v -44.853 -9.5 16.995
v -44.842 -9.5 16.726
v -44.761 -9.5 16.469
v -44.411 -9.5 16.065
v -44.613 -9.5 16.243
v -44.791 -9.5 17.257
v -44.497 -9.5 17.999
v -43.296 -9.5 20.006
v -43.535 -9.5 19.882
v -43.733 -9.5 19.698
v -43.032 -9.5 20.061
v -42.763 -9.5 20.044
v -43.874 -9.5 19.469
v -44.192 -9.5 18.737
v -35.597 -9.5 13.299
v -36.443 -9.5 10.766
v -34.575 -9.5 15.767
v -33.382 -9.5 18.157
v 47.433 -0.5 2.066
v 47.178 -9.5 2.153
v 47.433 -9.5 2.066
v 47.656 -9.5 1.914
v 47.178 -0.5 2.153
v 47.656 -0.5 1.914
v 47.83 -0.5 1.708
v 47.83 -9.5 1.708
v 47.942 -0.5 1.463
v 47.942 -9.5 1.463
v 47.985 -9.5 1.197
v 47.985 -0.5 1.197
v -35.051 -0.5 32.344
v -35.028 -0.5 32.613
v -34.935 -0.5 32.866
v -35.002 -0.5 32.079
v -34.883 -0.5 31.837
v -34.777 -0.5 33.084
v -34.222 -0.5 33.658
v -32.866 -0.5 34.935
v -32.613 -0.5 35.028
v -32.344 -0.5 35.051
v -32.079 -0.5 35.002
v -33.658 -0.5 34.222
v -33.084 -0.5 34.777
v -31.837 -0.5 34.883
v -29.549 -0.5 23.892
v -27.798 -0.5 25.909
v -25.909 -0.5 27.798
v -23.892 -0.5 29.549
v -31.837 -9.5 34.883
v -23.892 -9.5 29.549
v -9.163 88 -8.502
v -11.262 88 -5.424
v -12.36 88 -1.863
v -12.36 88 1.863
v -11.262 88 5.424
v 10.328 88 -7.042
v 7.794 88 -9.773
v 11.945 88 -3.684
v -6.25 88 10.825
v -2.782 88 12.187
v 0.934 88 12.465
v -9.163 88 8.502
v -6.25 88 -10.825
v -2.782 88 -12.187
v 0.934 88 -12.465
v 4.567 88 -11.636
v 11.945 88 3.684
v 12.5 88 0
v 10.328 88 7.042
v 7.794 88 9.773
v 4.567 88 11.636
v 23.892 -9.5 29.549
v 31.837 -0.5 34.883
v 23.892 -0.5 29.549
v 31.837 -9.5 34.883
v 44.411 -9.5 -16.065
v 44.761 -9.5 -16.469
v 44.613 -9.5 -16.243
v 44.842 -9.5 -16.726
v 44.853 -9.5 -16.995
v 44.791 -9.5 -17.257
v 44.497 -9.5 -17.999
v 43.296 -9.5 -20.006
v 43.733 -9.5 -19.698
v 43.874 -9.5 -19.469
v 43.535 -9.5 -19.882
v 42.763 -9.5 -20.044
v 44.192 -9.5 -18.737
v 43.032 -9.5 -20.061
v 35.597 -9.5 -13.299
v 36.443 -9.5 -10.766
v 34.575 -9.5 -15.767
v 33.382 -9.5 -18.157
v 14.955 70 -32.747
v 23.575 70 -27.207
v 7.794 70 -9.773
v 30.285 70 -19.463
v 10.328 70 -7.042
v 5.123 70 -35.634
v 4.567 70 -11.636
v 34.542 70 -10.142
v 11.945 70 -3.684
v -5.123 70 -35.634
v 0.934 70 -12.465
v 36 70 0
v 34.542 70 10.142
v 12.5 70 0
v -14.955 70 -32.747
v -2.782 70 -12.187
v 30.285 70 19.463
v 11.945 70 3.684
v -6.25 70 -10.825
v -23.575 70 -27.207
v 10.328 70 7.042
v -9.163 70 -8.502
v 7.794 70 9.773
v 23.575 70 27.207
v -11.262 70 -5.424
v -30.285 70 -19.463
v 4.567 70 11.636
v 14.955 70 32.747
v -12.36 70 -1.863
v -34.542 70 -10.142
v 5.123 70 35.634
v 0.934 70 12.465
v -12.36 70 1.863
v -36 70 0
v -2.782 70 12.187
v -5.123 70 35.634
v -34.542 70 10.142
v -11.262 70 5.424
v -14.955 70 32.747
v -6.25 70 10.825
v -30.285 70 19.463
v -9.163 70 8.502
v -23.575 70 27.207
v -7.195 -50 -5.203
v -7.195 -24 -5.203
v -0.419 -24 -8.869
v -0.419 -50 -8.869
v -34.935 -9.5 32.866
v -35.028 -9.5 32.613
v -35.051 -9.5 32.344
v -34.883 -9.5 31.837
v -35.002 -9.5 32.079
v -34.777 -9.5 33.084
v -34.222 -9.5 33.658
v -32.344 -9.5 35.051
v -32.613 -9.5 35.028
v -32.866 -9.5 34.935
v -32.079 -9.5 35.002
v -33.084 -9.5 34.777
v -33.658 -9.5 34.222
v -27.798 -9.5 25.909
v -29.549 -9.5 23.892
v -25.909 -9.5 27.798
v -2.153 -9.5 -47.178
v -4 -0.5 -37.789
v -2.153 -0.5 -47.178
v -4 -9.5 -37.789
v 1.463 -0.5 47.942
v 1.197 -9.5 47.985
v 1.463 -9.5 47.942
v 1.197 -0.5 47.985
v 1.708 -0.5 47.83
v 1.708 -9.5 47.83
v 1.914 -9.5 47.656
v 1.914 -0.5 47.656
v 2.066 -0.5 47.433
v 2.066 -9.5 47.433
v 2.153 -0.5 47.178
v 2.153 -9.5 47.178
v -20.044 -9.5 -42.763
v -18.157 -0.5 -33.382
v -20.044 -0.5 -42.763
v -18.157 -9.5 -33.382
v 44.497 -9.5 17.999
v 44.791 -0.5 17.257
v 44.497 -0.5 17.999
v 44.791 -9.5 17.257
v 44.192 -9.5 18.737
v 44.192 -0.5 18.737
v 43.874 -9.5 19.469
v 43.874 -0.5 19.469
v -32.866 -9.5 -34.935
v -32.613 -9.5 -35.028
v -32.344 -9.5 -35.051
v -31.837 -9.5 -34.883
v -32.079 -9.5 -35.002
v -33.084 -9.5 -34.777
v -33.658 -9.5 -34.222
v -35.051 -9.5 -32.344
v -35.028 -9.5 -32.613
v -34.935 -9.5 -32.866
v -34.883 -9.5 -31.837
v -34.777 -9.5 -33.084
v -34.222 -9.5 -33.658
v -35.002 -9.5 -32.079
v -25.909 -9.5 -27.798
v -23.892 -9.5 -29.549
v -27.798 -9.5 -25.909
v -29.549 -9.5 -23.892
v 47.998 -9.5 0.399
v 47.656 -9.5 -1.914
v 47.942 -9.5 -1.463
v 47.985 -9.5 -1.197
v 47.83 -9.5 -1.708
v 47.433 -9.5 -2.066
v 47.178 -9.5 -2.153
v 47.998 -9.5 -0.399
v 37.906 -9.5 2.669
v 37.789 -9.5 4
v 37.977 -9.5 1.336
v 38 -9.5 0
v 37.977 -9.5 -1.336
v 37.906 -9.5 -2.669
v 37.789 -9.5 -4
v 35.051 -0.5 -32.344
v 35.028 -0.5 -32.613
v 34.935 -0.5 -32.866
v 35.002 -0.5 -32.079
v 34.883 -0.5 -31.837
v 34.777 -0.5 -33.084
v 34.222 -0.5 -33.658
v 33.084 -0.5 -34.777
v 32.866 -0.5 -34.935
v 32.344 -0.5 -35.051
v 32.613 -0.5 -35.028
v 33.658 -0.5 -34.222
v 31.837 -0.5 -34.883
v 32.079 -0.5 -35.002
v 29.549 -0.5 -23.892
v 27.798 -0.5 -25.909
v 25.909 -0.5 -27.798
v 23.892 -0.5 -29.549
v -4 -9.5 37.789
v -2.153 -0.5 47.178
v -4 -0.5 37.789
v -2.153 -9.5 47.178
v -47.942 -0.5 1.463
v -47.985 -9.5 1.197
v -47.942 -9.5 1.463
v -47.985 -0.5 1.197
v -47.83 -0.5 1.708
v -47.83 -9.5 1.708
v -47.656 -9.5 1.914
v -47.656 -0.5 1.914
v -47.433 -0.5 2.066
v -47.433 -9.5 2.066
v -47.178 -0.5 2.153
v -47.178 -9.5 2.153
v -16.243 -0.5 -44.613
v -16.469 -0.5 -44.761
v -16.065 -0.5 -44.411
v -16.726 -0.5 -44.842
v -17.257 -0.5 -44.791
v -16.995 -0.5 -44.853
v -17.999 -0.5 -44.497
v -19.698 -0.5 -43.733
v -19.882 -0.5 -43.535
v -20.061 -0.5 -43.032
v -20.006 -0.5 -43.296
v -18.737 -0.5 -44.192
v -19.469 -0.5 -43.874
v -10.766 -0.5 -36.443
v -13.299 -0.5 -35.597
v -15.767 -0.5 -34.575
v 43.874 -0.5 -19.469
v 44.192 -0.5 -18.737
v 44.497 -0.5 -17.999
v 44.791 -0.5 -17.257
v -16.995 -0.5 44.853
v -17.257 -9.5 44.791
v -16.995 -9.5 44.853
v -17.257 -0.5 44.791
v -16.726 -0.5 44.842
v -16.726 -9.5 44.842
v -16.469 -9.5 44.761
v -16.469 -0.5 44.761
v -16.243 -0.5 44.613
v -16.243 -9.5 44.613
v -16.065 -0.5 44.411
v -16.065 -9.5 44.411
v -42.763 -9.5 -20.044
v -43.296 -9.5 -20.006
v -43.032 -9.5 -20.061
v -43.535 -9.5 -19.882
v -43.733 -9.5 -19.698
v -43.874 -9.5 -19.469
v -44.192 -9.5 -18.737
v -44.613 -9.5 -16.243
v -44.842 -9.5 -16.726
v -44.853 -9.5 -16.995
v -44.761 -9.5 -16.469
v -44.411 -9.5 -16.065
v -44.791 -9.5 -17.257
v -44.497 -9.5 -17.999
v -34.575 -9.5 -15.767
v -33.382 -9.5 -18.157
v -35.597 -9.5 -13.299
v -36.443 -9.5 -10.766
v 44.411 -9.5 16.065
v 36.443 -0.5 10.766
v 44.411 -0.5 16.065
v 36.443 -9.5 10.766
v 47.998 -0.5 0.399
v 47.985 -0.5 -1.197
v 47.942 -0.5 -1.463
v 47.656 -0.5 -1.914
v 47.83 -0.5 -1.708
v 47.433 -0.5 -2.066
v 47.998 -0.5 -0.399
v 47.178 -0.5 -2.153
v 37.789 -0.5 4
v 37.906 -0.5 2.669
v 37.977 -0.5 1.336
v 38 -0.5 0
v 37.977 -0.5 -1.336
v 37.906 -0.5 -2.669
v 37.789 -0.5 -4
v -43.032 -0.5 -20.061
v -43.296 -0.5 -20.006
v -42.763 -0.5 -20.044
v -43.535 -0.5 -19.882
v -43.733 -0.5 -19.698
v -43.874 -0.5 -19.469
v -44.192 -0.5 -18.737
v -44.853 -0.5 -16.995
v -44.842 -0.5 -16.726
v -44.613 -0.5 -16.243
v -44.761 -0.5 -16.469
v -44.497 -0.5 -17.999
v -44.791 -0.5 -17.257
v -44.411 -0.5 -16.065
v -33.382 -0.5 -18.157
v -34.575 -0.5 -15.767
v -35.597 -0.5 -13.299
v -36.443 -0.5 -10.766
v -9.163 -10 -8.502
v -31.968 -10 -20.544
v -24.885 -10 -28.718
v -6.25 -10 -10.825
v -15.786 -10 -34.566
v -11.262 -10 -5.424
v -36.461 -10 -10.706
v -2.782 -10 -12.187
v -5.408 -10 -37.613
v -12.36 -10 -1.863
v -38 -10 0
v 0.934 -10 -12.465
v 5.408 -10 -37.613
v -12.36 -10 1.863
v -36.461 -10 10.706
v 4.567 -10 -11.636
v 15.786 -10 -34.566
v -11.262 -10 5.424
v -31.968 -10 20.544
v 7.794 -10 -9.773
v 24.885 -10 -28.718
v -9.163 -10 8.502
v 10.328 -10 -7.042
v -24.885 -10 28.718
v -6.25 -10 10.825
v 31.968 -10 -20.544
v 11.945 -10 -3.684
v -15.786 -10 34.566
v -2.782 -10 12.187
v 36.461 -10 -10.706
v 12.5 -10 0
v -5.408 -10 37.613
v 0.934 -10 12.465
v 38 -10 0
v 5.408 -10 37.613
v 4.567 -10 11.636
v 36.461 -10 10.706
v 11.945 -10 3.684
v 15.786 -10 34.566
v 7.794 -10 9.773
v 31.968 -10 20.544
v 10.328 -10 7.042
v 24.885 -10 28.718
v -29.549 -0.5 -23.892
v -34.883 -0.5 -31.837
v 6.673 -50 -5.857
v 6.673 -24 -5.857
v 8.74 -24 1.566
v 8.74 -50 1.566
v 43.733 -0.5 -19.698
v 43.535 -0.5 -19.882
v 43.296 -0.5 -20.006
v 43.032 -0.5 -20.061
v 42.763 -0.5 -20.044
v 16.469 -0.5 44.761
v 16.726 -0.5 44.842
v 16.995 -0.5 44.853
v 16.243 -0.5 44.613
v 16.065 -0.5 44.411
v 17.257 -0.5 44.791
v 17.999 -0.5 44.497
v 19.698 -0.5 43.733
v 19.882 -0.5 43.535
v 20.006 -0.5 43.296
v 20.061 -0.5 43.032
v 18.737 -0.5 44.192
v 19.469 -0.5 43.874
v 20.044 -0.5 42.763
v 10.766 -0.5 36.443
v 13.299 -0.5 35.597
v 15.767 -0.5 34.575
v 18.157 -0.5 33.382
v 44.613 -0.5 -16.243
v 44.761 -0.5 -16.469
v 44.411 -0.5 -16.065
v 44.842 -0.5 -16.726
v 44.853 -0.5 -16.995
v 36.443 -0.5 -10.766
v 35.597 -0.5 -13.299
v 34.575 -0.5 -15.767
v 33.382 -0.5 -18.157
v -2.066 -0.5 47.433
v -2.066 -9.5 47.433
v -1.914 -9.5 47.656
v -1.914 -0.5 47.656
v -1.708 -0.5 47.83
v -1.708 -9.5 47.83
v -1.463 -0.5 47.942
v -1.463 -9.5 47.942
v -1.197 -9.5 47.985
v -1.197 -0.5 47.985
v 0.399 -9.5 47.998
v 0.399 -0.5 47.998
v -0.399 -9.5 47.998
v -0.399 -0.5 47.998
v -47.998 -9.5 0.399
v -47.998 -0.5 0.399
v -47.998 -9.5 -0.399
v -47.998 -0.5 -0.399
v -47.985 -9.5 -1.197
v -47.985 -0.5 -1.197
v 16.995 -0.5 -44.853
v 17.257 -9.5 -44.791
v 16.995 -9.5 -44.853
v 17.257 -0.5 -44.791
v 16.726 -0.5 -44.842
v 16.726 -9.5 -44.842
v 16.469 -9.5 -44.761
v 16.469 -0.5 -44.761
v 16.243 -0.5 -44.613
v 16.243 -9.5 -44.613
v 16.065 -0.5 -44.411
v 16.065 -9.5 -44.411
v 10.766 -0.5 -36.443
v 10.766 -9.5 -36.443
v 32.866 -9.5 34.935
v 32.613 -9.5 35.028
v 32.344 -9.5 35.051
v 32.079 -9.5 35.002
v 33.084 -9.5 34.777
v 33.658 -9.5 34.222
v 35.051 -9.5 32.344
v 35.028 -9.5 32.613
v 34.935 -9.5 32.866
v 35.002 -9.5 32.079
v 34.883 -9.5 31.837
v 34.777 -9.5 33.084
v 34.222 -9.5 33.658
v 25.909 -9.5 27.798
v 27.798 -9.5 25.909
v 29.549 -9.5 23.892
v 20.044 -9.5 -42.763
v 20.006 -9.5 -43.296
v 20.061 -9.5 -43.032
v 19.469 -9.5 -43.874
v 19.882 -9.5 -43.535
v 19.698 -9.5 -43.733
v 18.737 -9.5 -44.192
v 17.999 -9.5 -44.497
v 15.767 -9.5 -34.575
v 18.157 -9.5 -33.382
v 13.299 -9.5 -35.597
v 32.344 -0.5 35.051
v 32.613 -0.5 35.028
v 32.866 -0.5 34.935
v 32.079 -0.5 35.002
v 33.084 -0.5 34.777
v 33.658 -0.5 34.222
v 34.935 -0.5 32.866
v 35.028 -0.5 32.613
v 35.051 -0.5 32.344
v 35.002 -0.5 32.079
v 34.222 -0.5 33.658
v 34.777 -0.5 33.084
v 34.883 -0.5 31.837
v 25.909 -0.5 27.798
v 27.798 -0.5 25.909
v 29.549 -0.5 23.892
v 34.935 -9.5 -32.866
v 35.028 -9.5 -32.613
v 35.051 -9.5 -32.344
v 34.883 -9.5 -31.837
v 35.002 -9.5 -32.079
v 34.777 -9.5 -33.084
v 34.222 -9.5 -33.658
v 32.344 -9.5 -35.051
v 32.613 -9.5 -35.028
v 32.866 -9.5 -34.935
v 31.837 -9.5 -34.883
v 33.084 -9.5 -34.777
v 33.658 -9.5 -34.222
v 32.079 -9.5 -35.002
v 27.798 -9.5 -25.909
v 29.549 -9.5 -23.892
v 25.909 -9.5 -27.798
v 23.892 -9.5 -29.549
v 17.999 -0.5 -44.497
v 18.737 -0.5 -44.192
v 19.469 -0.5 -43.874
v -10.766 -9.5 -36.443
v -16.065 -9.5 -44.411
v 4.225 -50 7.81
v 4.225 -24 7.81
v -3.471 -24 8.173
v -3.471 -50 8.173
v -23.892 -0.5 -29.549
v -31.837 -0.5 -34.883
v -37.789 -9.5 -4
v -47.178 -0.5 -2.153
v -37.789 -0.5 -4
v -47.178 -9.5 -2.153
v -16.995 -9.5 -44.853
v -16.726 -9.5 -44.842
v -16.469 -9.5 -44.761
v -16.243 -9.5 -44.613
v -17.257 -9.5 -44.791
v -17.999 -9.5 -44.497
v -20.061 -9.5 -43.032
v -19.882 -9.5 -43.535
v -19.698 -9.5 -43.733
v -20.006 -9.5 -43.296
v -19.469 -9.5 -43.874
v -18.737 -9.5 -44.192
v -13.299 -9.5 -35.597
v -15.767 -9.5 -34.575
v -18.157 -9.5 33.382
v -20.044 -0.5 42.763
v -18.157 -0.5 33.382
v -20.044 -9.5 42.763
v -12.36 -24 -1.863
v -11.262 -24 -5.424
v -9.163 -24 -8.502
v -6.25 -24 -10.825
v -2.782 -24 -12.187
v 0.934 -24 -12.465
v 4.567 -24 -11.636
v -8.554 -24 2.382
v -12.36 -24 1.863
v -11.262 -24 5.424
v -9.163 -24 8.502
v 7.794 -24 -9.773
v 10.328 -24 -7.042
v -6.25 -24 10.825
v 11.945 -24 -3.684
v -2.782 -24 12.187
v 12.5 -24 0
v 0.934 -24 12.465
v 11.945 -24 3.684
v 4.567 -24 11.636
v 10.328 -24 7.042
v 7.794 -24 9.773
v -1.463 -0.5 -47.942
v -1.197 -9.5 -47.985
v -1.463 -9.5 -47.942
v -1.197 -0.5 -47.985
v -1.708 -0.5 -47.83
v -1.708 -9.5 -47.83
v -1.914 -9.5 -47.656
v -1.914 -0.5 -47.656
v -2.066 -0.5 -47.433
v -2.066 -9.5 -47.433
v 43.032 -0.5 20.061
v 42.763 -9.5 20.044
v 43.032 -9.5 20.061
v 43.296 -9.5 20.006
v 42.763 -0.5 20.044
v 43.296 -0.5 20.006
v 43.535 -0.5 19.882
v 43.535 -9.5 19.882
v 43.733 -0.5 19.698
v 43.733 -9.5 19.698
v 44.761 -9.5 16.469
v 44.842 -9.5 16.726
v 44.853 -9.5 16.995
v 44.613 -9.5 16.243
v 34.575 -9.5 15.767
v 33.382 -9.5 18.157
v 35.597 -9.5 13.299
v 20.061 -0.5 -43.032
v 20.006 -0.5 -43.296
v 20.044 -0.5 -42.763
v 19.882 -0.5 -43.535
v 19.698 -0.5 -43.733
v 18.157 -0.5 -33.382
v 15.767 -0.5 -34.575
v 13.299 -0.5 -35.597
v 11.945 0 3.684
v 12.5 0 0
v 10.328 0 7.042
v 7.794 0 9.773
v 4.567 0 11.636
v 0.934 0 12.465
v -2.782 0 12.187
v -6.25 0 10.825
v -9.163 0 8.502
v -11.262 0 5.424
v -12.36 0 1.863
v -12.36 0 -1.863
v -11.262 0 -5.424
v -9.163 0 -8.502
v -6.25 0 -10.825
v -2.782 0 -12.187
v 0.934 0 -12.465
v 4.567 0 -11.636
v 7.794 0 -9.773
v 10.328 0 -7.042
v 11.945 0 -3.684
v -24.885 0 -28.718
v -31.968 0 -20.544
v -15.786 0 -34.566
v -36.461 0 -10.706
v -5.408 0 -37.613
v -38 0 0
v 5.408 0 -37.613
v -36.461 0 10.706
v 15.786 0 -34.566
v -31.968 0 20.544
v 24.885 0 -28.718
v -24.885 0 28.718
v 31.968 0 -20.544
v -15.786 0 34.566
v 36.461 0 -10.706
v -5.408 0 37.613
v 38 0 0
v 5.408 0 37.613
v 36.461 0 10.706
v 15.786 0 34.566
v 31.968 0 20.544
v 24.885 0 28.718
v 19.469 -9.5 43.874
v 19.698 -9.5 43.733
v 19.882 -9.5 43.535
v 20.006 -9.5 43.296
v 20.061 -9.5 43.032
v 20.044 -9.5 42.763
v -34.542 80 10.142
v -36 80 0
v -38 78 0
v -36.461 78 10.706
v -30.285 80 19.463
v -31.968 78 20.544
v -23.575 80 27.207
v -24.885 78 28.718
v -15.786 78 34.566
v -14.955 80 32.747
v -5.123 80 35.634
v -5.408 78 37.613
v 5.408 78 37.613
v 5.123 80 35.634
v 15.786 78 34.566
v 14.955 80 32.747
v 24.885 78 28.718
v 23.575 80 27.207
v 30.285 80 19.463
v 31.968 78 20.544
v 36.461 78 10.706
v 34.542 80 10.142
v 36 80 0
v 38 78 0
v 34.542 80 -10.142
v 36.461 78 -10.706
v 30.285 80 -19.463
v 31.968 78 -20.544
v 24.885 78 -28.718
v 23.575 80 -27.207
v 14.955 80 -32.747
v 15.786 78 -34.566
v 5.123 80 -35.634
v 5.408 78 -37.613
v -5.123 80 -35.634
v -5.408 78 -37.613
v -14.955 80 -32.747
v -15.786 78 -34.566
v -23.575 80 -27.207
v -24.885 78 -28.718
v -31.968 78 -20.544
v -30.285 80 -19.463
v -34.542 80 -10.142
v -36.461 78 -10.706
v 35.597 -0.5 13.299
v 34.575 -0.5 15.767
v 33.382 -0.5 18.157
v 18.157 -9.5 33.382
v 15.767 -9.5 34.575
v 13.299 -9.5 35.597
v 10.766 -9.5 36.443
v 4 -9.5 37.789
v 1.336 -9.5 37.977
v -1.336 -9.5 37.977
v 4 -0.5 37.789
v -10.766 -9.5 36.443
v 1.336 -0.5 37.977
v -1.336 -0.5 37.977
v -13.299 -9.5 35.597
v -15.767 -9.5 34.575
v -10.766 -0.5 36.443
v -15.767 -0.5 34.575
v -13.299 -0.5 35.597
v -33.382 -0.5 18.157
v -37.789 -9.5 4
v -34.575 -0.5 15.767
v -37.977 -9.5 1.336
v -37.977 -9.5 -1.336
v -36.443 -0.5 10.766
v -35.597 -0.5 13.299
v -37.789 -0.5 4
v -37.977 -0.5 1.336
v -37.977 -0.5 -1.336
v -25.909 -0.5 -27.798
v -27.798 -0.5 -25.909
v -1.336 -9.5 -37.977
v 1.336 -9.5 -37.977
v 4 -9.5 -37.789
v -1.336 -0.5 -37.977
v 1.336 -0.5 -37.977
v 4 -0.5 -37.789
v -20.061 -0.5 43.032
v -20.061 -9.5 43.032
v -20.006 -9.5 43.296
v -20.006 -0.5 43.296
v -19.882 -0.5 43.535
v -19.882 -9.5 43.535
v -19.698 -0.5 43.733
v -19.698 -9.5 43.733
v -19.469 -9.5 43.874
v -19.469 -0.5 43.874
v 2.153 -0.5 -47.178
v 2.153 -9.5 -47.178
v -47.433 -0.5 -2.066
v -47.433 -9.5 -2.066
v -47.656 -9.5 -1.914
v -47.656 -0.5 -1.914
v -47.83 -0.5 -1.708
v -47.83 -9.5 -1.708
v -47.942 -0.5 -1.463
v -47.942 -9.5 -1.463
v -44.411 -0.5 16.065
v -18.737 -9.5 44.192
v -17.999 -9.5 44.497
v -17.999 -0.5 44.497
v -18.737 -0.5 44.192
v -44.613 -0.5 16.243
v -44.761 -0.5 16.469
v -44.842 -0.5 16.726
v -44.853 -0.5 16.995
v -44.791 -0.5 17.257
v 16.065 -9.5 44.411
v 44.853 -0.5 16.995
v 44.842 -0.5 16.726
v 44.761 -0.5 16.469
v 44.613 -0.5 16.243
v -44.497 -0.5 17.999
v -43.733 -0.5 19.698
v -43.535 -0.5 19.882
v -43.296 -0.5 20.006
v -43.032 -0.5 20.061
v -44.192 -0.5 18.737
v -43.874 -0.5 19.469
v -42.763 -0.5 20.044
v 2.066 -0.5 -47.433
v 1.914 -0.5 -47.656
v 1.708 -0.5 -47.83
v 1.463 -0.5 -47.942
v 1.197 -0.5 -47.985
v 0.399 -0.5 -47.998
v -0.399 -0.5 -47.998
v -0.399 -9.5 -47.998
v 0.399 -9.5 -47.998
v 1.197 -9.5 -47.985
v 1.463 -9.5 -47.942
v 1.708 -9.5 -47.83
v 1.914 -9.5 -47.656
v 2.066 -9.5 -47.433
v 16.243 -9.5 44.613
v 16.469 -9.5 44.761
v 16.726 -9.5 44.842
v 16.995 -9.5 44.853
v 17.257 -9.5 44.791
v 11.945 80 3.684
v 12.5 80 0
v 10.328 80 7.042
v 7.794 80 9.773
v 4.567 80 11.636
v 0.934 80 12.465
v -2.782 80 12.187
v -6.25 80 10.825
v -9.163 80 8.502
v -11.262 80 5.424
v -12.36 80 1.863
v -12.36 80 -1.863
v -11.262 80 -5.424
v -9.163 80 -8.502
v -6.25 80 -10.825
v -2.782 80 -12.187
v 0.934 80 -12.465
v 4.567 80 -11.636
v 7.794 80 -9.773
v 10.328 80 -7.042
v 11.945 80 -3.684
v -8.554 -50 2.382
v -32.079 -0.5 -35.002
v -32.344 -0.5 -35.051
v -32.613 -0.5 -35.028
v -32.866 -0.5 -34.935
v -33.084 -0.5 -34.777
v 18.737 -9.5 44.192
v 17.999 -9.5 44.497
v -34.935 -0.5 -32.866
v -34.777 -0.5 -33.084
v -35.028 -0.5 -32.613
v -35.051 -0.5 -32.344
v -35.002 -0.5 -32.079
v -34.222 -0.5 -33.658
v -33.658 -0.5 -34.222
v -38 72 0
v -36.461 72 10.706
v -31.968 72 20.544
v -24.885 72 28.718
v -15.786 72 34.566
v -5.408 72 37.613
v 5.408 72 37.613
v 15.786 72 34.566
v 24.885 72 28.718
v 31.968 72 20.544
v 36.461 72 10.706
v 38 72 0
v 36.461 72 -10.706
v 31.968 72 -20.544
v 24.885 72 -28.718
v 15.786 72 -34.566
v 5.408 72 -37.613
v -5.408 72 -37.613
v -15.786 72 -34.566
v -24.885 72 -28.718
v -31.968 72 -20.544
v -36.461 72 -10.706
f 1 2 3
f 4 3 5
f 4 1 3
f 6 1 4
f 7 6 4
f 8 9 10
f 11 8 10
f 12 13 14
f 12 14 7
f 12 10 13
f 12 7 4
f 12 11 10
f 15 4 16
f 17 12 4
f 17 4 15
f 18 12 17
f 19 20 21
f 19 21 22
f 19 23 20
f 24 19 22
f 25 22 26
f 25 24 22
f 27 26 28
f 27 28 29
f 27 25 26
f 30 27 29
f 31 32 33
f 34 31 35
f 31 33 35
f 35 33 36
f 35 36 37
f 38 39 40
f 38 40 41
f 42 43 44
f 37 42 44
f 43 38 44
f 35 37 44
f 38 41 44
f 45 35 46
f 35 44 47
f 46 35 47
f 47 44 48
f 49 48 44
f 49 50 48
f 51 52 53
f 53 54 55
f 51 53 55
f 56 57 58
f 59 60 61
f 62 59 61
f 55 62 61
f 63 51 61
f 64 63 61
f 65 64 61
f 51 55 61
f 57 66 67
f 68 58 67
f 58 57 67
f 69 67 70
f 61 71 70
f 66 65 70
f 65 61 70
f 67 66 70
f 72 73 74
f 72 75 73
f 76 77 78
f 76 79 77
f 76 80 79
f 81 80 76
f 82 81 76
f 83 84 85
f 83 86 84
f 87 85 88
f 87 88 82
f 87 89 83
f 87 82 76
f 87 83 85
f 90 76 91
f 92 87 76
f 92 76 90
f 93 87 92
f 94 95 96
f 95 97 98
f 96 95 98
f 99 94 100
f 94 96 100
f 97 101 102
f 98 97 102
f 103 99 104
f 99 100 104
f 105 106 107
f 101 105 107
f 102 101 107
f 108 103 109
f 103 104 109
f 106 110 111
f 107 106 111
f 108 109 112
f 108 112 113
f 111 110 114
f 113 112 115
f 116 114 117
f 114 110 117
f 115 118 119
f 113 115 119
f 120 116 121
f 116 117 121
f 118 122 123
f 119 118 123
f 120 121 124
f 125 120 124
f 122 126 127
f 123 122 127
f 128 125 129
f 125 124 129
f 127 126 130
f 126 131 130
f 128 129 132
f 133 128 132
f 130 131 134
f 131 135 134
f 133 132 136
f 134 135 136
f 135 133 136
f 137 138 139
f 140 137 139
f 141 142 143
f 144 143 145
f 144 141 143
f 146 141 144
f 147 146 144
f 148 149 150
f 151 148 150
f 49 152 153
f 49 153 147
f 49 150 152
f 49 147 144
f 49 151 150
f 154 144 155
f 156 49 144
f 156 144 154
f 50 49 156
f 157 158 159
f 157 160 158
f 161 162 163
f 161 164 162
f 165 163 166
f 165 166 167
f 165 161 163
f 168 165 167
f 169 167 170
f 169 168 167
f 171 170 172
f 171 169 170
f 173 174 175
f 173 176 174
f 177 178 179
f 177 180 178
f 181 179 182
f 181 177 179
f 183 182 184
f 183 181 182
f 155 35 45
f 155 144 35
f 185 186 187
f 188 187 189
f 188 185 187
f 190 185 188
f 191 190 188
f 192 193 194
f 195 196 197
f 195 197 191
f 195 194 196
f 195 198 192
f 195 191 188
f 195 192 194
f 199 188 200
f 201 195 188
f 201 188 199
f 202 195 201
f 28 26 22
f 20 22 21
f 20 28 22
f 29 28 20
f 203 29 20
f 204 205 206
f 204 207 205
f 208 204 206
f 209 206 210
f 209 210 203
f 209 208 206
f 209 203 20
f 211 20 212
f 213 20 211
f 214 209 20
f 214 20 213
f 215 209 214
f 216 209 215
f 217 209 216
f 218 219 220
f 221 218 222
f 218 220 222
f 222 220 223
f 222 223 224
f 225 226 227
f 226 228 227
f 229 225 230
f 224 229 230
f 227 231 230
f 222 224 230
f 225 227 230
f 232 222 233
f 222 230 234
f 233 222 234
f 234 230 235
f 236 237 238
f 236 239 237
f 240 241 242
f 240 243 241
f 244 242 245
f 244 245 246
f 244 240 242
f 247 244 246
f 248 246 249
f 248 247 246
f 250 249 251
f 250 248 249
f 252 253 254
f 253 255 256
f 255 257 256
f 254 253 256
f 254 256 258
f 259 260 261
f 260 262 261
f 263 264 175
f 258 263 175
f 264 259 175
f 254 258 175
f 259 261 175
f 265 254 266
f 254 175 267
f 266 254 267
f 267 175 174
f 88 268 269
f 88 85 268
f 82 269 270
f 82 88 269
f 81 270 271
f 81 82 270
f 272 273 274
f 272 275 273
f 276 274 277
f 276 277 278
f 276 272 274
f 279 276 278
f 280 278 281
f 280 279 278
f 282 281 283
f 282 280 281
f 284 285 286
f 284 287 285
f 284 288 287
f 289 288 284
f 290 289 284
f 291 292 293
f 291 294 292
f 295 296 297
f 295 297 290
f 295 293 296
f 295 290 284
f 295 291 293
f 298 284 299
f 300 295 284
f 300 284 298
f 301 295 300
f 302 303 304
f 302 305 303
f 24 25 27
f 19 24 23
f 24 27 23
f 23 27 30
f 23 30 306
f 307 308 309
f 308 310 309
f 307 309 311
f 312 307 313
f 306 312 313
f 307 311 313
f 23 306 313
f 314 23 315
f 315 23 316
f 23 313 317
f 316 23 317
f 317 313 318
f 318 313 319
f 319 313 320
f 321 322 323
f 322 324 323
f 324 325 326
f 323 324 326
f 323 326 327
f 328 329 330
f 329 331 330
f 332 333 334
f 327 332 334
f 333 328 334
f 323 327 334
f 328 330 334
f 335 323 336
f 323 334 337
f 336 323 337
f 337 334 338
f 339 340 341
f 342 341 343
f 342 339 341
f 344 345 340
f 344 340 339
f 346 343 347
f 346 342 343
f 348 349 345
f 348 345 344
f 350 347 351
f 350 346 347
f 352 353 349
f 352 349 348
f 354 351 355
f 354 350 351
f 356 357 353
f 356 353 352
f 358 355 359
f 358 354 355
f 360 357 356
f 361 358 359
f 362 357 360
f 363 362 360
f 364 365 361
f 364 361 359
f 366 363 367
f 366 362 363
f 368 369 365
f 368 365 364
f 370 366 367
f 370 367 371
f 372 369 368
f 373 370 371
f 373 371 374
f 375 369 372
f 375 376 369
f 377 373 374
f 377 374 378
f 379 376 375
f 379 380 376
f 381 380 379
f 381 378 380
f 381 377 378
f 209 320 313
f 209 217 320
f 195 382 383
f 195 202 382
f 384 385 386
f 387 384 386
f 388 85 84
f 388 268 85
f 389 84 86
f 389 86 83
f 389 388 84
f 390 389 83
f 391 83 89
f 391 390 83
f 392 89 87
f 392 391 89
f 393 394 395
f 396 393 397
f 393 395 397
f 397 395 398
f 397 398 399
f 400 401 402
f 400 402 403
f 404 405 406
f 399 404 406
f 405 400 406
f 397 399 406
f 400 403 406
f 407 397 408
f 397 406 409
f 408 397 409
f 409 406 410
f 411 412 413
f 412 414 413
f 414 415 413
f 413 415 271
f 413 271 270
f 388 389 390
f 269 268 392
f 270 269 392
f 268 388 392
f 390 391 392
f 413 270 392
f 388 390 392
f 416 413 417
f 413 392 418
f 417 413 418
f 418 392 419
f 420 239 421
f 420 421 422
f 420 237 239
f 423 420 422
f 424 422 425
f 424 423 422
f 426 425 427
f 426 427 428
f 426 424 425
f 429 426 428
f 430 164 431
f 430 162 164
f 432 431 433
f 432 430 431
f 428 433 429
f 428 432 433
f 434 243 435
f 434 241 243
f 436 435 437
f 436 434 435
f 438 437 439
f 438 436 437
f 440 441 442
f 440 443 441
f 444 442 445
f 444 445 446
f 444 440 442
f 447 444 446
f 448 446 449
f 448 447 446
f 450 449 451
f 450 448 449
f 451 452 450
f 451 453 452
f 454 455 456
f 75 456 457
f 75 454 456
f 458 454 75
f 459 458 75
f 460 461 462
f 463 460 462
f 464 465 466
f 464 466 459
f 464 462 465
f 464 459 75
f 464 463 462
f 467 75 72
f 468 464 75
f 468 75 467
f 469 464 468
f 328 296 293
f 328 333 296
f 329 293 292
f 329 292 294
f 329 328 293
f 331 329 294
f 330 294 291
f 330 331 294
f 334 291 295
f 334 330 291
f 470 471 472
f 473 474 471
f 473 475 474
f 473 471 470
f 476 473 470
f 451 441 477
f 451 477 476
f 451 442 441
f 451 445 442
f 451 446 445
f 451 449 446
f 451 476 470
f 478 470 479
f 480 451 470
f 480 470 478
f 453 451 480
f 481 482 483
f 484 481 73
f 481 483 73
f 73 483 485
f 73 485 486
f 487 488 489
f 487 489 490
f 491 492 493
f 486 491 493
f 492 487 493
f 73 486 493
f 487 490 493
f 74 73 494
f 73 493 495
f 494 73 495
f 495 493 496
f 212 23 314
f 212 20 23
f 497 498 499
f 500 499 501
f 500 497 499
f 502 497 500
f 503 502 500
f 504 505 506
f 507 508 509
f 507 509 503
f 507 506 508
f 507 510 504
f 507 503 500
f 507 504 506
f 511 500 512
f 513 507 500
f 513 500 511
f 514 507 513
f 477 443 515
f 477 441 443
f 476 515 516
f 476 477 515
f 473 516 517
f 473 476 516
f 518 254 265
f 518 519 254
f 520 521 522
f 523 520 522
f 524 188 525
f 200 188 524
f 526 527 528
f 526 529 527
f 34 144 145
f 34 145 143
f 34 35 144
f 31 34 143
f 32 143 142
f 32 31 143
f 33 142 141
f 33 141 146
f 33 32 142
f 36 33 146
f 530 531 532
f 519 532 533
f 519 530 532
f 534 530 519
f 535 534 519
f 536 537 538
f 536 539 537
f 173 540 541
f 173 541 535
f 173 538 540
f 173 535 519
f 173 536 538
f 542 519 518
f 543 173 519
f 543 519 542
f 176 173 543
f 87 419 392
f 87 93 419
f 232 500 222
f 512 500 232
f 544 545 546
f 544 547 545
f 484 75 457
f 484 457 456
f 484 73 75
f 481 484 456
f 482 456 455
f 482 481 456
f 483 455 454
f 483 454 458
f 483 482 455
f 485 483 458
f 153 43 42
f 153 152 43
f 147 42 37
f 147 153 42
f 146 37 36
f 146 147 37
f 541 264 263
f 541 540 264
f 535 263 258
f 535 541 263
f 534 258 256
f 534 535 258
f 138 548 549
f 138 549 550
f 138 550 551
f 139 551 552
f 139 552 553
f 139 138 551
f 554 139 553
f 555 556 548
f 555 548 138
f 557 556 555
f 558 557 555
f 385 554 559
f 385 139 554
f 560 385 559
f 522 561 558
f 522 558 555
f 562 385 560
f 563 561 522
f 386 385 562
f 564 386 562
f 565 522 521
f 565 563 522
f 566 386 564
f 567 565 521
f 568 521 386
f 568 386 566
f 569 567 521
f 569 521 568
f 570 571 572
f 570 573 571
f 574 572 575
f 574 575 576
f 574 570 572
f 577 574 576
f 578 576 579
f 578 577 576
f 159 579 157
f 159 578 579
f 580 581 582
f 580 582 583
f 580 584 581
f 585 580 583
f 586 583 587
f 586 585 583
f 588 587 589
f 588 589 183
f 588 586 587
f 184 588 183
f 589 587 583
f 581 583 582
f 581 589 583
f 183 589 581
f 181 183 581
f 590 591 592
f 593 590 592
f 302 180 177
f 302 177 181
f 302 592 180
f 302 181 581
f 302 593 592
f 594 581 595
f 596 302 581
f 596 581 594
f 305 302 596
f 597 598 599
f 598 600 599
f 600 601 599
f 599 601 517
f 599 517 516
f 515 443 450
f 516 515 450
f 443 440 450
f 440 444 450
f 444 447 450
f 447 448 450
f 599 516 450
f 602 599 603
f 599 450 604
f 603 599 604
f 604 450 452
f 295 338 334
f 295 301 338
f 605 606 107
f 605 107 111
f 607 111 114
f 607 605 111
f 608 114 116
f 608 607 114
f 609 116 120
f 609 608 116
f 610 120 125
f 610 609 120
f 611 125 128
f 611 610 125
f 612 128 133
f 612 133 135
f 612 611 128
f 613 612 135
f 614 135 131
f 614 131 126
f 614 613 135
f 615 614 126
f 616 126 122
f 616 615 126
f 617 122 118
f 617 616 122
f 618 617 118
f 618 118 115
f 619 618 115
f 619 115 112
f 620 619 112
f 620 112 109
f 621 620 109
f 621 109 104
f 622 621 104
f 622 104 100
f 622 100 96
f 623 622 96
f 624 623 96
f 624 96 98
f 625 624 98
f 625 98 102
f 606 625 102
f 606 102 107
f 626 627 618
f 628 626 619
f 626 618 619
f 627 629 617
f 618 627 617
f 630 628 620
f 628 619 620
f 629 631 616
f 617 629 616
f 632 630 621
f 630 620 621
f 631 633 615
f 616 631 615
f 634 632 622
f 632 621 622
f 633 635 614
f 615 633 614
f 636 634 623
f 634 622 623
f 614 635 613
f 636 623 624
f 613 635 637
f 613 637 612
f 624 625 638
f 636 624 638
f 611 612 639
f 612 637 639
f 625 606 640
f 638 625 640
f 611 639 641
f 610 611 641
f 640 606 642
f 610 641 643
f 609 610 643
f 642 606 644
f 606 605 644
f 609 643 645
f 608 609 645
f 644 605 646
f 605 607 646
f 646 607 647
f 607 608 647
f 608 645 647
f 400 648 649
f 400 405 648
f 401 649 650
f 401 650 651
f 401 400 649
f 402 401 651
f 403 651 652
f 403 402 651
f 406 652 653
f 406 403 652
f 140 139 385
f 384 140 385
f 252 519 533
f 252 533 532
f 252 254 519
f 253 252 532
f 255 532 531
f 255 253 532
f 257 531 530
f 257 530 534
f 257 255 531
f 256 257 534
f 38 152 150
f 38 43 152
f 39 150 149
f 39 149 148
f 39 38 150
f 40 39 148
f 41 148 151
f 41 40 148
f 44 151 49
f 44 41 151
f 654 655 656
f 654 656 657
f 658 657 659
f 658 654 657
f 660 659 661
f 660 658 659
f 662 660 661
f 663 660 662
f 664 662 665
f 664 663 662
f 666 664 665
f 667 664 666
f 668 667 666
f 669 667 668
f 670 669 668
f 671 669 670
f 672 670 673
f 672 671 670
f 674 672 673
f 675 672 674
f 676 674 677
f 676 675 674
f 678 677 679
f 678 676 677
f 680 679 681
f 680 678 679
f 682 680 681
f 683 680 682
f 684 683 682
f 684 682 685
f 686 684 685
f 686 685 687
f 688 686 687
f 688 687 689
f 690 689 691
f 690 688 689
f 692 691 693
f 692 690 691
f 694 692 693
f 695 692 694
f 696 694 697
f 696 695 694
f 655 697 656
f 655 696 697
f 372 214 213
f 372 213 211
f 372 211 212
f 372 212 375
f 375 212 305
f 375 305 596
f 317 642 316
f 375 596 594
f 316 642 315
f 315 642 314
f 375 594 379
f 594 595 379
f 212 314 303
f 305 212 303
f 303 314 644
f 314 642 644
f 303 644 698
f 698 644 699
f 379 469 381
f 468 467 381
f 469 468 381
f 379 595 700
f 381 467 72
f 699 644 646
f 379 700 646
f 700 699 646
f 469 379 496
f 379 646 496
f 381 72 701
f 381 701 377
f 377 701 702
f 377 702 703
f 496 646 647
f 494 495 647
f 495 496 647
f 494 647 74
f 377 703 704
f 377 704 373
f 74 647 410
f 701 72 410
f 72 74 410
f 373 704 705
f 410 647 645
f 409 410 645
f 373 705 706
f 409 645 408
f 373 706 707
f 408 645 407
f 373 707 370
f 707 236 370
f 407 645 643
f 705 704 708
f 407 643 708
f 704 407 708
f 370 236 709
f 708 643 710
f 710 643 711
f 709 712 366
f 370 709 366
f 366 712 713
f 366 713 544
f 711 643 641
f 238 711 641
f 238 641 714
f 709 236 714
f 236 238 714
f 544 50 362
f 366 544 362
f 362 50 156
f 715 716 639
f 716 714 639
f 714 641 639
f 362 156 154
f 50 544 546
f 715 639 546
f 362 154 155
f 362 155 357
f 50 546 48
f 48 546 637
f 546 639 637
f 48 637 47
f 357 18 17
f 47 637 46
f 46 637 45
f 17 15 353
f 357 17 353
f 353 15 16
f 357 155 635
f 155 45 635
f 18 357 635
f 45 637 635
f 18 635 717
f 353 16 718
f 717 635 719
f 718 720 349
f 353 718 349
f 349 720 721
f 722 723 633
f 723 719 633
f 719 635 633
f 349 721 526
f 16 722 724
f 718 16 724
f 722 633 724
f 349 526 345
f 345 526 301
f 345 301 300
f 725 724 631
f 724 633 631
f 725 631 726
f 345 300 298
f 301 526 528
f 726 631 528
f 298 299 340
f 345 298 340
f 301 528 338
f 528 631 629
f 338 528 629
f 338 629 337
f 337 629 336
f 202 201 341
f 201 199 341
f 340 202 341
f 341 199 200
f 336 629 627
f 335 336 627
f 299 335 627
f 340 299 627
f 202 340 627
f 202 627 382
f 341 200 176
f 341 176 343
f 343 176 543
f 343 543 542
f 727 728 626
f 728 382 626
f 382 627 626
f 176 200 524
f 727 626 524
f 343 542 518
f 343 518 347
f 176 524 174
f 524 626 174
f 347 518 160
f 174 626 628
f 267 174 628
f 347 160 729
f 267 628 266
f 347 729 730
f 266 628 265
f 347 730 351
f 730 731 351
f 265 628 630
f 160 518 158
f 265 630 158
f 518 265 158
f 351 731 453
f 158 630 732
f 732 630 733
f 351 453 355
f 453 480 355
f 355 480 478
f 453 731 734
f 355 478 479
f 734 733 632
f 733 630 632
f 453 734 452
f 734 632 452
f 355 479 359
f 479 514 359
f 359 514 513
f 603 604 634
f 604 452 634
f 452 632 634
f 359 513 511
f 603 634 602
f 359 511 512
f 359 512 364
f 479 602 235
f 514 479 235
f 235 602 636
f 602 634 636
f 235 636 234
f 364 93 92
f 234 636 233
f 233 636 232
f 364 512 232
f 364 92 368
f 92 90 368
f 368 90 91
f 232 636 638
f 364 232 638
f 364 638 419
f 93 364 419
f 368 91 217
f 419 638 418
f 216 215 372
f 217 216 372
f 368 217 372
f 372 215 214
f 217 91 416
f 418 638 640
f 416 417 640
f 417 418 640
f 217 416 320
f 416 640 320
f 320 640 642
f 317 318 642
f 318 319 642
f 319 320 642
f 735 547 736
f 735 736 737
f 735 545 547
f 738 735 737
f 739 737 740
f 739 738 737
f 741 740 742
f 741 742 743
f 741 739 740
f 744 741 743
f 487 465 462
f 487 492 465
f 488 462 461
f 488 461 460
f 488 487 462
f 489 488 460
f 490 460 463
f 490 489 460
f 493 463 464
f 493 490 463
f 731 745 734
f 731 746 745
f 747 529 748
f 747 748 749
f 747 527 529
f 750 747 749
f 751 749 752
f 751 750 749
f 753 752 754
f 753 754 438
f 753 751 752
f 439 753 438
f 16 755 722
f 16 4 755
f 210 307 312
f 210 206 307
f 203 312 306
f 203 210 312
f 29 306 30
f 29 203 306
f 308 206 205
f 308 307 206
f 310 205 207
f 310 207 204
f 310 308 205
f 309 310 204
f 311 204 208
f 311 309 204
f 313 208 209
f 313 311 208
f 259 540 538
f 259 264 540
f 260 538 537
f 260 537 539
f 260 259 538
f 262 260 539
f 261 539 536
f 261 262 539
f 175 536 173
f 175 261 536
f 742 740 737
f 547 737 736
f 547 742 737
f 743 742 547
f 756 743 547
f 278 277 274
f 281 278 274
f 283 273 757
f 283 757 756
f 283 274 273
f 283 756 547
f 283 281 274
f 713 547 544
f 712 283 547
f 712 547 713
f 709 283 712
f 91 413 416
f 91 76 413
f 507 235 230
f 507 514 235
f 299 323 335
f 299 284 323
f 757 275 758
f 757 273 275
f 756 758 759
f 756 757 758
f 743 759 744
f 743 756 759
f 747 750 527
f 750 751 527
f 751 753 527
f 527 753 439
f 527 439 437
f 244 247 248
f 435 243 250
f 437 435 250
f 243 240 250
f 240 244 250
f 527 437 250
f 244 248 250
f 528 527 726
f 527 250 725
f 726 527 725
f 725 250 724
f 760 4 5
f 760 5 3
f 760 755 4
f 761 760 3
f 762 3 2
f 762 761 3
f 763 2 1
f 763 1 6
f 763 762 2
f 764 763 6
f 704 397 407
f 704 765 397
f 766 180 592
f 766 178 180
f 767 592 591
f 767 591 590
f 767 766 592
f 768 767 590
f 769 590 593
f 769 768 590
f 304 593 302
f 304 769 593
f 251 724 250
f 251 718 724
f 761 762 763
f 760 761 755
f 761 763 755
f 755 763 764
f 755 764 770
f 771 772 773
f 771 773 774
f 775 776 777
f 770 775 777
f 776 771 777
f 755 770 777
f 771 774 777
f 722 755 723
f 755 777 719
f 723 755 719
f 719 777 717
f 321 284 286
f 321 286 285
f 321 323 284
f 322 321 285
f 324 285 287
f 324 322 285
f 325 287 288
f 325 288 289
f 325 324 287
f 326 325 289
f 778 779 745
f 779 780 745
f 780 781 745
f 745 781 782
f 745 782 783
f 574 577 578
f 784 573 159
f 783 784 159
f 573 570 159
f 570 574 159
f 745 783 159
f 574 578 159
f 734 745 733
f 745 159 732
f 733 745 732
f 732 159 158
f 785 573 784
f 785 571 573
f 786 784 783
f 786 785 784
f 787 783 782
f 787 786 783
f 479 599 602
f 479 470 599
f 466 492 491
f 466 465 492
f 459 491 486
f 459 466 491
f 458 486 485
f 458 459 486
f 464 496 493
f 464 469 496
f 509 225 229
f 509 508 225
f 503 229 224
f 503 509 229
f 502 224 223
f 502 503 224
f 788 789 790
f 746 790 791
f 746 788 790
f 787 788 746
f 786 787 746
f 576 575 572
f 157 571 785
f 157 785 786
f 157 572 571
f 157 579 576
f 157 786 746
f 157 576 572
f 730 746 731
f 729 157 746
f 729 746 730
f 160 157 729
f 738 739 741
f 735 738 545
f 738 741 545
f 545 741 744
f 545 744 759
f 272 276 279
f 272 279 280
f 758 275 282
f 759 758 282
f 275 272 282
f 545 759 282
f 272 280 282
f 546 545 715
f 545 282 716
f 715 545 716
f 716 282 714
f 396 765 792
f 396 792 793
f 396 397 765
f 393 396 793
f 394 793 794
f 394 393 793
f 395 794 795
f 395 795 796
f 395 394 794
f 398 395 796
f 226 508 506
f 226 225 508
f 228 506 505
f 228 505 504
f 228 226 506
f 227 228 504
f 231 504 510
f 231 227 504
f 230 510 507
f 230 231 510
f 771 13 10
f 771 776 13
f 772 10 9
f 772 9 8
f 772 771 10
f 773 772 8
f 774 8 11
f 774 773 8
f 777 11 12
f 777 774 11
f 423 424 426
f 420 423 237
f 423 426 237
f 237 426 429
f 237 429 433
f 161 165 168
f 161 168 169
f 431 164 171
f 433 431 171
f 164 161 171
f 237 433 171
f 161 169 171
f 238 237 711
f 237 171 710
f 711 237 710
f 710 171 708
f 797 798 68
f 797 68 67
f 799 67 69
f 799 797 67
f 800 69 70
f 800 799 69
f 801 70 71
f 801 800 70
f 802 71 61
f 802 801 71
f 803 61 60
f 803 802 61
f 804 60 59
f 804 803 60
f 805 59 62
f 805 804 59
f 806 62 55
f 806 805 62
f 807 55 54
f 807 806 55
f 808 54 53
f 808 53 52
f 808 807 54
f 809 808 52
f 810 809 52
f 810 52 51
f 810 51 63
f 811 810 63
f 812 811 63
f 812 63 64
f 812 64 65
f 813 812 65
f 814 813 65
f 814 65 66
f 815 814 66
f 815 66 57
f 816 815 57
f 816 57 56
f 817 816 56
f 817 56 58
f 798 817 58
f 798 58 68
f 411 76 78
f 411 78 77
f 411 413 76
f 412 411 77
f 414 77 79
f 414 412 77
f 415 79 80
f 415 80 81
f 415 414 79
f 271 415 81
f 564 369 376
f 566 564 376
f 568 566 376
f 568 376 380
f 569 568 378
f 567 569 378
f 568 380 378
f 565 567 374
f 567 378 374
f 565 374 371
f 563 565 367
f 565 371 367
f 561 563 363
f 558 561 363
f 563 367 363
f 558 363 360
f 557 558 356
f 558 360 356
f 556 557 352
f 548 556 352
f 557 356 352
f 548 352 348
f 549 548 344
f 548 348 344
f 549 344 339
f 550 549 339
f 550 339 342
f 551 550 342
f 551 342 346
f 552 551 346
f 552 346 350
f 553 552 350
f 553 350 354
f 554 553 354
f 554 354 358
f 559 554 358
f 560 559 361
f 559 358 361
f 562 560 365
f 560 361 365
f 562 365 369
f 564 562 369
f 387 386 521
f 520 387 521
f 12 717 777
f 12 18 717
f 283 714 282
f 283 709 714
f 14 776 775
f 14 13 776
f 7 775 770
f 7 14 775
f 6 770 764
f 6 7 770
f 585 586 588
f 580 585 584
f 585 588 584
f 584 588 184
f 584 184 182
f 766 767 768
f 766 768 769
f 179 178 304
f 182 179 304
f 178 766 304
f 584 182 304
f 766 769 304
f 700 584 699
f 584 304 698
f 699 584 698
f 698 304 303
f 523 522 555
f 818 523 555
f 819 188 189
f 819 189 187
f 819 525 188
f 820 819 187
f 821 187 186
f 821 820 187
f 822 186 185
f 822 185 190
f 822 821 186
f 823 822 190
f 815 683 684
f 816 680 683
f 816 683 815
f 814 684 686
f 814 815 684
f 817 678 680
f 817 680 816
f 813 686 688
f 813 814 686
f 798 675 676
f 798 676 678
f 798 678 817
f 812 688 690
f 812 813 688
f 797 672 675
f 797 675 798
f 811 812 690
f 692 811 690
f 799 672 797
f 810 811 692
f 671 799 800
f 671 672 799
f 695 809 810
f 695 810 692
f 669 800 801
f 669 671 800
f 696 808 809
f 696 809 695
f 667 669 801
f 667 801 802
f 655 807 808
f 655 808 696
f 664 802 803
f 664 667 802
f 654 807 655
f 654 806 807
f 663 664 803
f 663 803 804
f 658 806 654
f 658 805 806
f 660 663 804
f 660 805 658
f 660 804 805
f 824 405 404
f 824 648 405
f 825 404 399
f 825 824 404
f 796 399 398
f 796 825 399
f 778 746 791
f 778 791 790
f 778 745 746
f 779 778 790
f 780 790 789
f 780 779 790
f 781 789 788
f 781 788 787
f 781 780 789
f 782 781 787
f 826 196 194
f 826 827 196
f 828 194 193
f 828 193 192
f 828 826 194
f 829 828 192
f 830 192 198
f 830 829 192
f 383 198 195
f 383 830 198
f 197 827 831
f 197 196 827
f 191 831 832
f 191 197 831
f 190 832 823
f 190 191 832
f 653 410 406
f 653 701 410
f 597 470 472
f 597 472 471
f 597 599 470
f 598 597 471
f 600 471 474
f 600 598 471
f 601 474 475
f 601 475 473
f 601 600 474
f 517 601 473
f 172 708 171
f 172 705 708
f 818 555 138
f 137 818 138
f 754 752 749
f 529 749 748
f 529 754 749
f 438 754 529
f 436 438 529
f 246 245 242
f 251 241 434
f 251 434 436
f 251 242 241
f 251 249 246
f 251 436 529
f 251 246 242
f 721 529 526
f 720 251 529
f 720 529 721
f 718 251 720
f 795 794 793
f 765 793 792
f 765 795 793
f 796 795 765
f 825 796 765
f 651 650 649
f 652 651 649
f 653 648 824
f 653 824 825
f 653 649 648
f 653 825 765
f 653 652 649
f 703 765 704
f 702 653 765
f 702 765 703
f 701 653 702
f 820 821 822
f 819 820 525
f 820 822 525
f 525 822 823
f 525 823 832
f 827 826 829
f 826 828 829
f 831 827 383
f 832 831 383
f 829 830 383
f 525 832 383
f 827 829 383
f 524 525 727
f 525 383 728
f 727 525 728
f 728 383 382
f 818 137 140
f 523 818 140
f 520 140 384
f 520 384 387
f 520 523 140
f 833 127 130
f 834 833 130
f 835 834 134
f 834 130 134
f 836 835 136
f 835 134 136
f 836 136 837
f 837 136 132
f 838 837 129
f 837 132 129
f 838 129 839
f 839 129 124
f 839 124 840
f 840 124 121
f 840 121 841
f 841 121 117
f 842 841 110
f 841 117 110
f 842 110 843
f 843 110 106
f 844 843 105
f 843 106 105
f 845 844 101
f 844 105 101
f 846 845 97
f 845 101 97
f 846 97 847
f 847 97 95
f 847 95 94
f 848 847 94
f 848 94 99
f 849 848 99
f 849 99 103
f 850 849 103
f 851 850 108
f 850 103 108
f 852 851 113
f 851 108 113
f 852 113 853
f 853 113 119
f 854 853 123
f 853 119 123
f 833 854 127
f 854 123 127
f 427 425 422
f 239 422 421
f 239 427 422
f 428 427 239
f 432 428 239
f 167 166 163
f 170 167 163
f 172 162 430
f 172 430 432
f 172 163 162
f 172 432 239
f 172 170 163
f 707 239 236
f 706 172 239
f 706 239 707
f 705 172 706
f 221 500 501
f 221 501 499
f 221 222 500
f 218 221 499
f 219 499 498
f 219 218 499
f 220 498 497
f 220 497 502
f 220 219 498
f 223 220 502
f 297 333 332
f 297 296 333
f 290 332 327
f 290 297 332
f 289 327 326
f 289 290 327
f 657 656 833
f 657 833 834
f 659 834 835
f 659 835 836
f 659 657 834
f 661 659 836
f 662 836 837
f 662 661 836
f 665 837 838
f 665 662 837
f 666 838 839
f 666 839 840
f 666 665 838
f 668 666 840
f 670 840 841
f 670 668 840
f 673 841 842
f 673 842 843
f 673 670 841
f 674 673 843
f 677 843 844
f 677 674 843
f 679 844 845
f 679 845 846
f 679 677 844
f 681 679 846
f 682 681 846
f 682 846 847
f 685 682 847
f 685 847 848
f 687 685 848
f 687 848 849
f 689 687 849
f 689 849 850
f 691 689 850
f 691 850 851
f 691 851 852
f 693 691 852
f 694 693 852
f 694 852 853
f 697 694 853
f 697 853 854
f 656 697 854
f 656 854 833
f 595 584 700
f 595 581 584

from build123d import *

# Parameters (mm, degrees)
F0_R      = 38
F1_DEPTH  = 10
F4_DEPTH  = 4.5
F5_R      = 1
F6_COUNT  = 16
F7_R      = 12.5
F8_DEPTH  = 98
F9_DEPTH  = 14
F11_DEPTH = 26
F13_R     = 38
F14_DEPTH = 5
F15_SIZE  = 2


with BuildPart() as f1:
    # F0 (on Front) → F1 (new body)
    with BuildSketch(Plane.XZ):
        Circle(F0_R)
    extrude(amount=F1_DEPTH)

    # F3 (on mid) → F4 (join, symmetric)
    with BuildSketch(Plane.XZ.offset(5)):
        with BuildLine():
            Line((-47.9583152331, -2), (-37.7888872554, -4))
            Line((-37.7888872554, -4), (-37.7888872554, 4))
            Line((-37.7888872554, 4), (-47.9583152331, 2))
            ThreePointArc((-47.9583152331, 2), (-48, 0), (-47.9583152331, -2))
        make_face()
    extrude(amount=F4_DEPTH, both=True)

    # F5
    f5_edges = [f1.edges().sort_by_distance(p)[0] for p in [
        (-47.958315, -5, -2),
        (-47.958315, -5, 2),
    ]]
    fillet(f5_edges, radius=F5_R)


with BuildPart() as f6_1:
    # F6: instance of F1
    add(f1.part.rotate(Axis((0, 0, 0), (0, -1, 0)), 1 * 360 / F6_COUNT))


with BuildPart() as f6_2:
    # F6: instance of F1
    add(f1.part.rotate(Axis((0, 0, 0), (0, -1, 0)), 2 * 360 / F6_COUNT))


with BuildPart() as f6_3:
    # F6: instance of F1
    add(f1.part.rotate(Axis((0, 0, 0), (0, -1, 0)), 3 * 360 / F6_COUNT))


with BuildPart() as f6_4:
    # F6: instance of F1
    add(f1.part.rotate(Axis((0, 0, 0), (0, -1, 0)), 4 * 360 / F6_COUNT))


with BuildPart() as f6_5:
    # F6: instance of F1
    add(f1.part.rotate(Axis((0, 0, 0), (0, -1, 0)), 5 * 360 / F6_COUNT))


with BuildPart() as f6_6:
    # F6: instance of F1
    add(f1.part.rotate(Axis((0, 0, 0), (0, -1, 0)), 6 * 360 / F6_COUNT))


with BuildPart() as f6_7:
    # F6: instance of F1
    add(f1.part.rotate(Axis((0, 0, 0), (0, -1, 0)), 7 * 360 / F6_COUNT))


with BuildPart() as f6_8:
    # F6: instance of F1
    add(f1.part.rotate(Axis((0, 0, 0), (0, -1, 0)), 8 * 360 / F6_COUNT))


with BuildPart() as f6_9:
    # F6: instance of F1
    add(f1.part.rotate(Axis((0, 0, 0), (0, -1, 0)), 9 * 360 / F6_COUNT))


with BuildPart() as f6_10:
    # F6: instance of F1
    add(f1.part.rotate(Axis((0, 0, 0), (0, -1, 0)), 10 * 360 / F6_COUNT))


with BuildPart() as f6_11:
    # F6: instance of F1
    add(f1.part.rotate(Axis((0, 0, 0), (0, -1, 0)), 11 * 360 / F6_COUNT))


with BuildPart() as f6_12:
    # F6: instance of F1
    add(f1.part.rotate(Axis((0, 0, 0), (0, -1, 0)), 12 * 360 / F6_COUNT))


with BuildPart() as f6_13:
    # F6: instance of F1
    add(f1.part.rotate(Axis((0, 0, 0), (0, -1, 0)), 13 * 360 / F6_COUNT))


with BuildPart() as f6_14:
    # F6: instance of F1
    add(f1.part.rotate(Axis((0, 0, 0), (0, -1, 0)), 14 * 360 / F6_COUNT))


with BuildPart() as f6_15:
    # F6: instance of F1
    add(f1.part.rotate(Axis((0, 0, 0), (0, -1, 0)), 15 * 360 / F6_COUNT))


with BuildPart() as f8:
    # F7 (on face) → F8 (new body)
    with BuildSketch(Plane.XZ.offset(10)):
        Circle(F7_R)
    extrude(amount=-F8_DEPTH)


with BuildPart() as f9:
    # F9 (new): a face of the model
    f9_faces = [f8.part.faces().sort_by_distance(p)[0] for p in [
        (0, -10, 0),
    ]]
    extrude(f9_faces, amount=F9_DEPTH)

    # F10 (on face) → F11 (join)
    with BuildSketch(Plane.XZ.offset(24)):
        Polygon((8.7402150444, 1.5656130559), (4.2253893698, 7.8095190592), (-3.4712406825, 8.1726979258), (-8.5539557005, 2.3816685616), (-7.1953676071, -5.2028058067), (-0.4185209468, -8.8694612846), (6.6734805227, -5.8572315112), align=None)
    extrude(amount=F11_DEPTH)


with BuildPart() as f1_1:
    add(f1.part)

    add(f6_1.part)  # F14 merges F6_1

    add(f6_2.part)  # F14 merges F6_2

    add(f6_3.part)  # F14 merges F6_3

    add(f6_4.part)  # F14 merges F6_4

    add(f6_5.part)  # F14 merges F6_5

    add(f6_6.part)  # F14 merges F6_6

    add(f6_7.part)  # F14 merges F6_7

    add(f6_8.part)  # F14 merges F6_8

    add(f6_9.part)  # F14 merges F6_9

    add(f6_10.part)  # F14 merges F6_10

    add(f6_11.part)  # F14 merges F6_11

    add(f6_12.part)  # F14 merges F6_12

    add(f6_13.part)  # F14 merges F6_13

    add(f6_14.part)  # F14 merges F6_14

    add(f6_15.part)  # F14 merges F6_15

    add(f8.part)  # F14 merges F8

    add(f9.part)  # F14 merges F9
    # F13 (on offset) → F14 (join, symmetric)
    with BuildSketch(Plane(origin=(0, 75, 0), x_dir=(-1, 0, 0), z_dir=(0, 1, 0))):
        Circle(F13_R)
    extrude(amount=F14_DEPTH, both=True)

    # F15
    f15_edges = [f1_1.edges().sort_by_distance(p)[0] for p in [
        (38, 80, 0),
        (38, 70, 0),
    ]]
    chamfer(f15_edges, length=F15_SIZE)


solid = f1_1.part
